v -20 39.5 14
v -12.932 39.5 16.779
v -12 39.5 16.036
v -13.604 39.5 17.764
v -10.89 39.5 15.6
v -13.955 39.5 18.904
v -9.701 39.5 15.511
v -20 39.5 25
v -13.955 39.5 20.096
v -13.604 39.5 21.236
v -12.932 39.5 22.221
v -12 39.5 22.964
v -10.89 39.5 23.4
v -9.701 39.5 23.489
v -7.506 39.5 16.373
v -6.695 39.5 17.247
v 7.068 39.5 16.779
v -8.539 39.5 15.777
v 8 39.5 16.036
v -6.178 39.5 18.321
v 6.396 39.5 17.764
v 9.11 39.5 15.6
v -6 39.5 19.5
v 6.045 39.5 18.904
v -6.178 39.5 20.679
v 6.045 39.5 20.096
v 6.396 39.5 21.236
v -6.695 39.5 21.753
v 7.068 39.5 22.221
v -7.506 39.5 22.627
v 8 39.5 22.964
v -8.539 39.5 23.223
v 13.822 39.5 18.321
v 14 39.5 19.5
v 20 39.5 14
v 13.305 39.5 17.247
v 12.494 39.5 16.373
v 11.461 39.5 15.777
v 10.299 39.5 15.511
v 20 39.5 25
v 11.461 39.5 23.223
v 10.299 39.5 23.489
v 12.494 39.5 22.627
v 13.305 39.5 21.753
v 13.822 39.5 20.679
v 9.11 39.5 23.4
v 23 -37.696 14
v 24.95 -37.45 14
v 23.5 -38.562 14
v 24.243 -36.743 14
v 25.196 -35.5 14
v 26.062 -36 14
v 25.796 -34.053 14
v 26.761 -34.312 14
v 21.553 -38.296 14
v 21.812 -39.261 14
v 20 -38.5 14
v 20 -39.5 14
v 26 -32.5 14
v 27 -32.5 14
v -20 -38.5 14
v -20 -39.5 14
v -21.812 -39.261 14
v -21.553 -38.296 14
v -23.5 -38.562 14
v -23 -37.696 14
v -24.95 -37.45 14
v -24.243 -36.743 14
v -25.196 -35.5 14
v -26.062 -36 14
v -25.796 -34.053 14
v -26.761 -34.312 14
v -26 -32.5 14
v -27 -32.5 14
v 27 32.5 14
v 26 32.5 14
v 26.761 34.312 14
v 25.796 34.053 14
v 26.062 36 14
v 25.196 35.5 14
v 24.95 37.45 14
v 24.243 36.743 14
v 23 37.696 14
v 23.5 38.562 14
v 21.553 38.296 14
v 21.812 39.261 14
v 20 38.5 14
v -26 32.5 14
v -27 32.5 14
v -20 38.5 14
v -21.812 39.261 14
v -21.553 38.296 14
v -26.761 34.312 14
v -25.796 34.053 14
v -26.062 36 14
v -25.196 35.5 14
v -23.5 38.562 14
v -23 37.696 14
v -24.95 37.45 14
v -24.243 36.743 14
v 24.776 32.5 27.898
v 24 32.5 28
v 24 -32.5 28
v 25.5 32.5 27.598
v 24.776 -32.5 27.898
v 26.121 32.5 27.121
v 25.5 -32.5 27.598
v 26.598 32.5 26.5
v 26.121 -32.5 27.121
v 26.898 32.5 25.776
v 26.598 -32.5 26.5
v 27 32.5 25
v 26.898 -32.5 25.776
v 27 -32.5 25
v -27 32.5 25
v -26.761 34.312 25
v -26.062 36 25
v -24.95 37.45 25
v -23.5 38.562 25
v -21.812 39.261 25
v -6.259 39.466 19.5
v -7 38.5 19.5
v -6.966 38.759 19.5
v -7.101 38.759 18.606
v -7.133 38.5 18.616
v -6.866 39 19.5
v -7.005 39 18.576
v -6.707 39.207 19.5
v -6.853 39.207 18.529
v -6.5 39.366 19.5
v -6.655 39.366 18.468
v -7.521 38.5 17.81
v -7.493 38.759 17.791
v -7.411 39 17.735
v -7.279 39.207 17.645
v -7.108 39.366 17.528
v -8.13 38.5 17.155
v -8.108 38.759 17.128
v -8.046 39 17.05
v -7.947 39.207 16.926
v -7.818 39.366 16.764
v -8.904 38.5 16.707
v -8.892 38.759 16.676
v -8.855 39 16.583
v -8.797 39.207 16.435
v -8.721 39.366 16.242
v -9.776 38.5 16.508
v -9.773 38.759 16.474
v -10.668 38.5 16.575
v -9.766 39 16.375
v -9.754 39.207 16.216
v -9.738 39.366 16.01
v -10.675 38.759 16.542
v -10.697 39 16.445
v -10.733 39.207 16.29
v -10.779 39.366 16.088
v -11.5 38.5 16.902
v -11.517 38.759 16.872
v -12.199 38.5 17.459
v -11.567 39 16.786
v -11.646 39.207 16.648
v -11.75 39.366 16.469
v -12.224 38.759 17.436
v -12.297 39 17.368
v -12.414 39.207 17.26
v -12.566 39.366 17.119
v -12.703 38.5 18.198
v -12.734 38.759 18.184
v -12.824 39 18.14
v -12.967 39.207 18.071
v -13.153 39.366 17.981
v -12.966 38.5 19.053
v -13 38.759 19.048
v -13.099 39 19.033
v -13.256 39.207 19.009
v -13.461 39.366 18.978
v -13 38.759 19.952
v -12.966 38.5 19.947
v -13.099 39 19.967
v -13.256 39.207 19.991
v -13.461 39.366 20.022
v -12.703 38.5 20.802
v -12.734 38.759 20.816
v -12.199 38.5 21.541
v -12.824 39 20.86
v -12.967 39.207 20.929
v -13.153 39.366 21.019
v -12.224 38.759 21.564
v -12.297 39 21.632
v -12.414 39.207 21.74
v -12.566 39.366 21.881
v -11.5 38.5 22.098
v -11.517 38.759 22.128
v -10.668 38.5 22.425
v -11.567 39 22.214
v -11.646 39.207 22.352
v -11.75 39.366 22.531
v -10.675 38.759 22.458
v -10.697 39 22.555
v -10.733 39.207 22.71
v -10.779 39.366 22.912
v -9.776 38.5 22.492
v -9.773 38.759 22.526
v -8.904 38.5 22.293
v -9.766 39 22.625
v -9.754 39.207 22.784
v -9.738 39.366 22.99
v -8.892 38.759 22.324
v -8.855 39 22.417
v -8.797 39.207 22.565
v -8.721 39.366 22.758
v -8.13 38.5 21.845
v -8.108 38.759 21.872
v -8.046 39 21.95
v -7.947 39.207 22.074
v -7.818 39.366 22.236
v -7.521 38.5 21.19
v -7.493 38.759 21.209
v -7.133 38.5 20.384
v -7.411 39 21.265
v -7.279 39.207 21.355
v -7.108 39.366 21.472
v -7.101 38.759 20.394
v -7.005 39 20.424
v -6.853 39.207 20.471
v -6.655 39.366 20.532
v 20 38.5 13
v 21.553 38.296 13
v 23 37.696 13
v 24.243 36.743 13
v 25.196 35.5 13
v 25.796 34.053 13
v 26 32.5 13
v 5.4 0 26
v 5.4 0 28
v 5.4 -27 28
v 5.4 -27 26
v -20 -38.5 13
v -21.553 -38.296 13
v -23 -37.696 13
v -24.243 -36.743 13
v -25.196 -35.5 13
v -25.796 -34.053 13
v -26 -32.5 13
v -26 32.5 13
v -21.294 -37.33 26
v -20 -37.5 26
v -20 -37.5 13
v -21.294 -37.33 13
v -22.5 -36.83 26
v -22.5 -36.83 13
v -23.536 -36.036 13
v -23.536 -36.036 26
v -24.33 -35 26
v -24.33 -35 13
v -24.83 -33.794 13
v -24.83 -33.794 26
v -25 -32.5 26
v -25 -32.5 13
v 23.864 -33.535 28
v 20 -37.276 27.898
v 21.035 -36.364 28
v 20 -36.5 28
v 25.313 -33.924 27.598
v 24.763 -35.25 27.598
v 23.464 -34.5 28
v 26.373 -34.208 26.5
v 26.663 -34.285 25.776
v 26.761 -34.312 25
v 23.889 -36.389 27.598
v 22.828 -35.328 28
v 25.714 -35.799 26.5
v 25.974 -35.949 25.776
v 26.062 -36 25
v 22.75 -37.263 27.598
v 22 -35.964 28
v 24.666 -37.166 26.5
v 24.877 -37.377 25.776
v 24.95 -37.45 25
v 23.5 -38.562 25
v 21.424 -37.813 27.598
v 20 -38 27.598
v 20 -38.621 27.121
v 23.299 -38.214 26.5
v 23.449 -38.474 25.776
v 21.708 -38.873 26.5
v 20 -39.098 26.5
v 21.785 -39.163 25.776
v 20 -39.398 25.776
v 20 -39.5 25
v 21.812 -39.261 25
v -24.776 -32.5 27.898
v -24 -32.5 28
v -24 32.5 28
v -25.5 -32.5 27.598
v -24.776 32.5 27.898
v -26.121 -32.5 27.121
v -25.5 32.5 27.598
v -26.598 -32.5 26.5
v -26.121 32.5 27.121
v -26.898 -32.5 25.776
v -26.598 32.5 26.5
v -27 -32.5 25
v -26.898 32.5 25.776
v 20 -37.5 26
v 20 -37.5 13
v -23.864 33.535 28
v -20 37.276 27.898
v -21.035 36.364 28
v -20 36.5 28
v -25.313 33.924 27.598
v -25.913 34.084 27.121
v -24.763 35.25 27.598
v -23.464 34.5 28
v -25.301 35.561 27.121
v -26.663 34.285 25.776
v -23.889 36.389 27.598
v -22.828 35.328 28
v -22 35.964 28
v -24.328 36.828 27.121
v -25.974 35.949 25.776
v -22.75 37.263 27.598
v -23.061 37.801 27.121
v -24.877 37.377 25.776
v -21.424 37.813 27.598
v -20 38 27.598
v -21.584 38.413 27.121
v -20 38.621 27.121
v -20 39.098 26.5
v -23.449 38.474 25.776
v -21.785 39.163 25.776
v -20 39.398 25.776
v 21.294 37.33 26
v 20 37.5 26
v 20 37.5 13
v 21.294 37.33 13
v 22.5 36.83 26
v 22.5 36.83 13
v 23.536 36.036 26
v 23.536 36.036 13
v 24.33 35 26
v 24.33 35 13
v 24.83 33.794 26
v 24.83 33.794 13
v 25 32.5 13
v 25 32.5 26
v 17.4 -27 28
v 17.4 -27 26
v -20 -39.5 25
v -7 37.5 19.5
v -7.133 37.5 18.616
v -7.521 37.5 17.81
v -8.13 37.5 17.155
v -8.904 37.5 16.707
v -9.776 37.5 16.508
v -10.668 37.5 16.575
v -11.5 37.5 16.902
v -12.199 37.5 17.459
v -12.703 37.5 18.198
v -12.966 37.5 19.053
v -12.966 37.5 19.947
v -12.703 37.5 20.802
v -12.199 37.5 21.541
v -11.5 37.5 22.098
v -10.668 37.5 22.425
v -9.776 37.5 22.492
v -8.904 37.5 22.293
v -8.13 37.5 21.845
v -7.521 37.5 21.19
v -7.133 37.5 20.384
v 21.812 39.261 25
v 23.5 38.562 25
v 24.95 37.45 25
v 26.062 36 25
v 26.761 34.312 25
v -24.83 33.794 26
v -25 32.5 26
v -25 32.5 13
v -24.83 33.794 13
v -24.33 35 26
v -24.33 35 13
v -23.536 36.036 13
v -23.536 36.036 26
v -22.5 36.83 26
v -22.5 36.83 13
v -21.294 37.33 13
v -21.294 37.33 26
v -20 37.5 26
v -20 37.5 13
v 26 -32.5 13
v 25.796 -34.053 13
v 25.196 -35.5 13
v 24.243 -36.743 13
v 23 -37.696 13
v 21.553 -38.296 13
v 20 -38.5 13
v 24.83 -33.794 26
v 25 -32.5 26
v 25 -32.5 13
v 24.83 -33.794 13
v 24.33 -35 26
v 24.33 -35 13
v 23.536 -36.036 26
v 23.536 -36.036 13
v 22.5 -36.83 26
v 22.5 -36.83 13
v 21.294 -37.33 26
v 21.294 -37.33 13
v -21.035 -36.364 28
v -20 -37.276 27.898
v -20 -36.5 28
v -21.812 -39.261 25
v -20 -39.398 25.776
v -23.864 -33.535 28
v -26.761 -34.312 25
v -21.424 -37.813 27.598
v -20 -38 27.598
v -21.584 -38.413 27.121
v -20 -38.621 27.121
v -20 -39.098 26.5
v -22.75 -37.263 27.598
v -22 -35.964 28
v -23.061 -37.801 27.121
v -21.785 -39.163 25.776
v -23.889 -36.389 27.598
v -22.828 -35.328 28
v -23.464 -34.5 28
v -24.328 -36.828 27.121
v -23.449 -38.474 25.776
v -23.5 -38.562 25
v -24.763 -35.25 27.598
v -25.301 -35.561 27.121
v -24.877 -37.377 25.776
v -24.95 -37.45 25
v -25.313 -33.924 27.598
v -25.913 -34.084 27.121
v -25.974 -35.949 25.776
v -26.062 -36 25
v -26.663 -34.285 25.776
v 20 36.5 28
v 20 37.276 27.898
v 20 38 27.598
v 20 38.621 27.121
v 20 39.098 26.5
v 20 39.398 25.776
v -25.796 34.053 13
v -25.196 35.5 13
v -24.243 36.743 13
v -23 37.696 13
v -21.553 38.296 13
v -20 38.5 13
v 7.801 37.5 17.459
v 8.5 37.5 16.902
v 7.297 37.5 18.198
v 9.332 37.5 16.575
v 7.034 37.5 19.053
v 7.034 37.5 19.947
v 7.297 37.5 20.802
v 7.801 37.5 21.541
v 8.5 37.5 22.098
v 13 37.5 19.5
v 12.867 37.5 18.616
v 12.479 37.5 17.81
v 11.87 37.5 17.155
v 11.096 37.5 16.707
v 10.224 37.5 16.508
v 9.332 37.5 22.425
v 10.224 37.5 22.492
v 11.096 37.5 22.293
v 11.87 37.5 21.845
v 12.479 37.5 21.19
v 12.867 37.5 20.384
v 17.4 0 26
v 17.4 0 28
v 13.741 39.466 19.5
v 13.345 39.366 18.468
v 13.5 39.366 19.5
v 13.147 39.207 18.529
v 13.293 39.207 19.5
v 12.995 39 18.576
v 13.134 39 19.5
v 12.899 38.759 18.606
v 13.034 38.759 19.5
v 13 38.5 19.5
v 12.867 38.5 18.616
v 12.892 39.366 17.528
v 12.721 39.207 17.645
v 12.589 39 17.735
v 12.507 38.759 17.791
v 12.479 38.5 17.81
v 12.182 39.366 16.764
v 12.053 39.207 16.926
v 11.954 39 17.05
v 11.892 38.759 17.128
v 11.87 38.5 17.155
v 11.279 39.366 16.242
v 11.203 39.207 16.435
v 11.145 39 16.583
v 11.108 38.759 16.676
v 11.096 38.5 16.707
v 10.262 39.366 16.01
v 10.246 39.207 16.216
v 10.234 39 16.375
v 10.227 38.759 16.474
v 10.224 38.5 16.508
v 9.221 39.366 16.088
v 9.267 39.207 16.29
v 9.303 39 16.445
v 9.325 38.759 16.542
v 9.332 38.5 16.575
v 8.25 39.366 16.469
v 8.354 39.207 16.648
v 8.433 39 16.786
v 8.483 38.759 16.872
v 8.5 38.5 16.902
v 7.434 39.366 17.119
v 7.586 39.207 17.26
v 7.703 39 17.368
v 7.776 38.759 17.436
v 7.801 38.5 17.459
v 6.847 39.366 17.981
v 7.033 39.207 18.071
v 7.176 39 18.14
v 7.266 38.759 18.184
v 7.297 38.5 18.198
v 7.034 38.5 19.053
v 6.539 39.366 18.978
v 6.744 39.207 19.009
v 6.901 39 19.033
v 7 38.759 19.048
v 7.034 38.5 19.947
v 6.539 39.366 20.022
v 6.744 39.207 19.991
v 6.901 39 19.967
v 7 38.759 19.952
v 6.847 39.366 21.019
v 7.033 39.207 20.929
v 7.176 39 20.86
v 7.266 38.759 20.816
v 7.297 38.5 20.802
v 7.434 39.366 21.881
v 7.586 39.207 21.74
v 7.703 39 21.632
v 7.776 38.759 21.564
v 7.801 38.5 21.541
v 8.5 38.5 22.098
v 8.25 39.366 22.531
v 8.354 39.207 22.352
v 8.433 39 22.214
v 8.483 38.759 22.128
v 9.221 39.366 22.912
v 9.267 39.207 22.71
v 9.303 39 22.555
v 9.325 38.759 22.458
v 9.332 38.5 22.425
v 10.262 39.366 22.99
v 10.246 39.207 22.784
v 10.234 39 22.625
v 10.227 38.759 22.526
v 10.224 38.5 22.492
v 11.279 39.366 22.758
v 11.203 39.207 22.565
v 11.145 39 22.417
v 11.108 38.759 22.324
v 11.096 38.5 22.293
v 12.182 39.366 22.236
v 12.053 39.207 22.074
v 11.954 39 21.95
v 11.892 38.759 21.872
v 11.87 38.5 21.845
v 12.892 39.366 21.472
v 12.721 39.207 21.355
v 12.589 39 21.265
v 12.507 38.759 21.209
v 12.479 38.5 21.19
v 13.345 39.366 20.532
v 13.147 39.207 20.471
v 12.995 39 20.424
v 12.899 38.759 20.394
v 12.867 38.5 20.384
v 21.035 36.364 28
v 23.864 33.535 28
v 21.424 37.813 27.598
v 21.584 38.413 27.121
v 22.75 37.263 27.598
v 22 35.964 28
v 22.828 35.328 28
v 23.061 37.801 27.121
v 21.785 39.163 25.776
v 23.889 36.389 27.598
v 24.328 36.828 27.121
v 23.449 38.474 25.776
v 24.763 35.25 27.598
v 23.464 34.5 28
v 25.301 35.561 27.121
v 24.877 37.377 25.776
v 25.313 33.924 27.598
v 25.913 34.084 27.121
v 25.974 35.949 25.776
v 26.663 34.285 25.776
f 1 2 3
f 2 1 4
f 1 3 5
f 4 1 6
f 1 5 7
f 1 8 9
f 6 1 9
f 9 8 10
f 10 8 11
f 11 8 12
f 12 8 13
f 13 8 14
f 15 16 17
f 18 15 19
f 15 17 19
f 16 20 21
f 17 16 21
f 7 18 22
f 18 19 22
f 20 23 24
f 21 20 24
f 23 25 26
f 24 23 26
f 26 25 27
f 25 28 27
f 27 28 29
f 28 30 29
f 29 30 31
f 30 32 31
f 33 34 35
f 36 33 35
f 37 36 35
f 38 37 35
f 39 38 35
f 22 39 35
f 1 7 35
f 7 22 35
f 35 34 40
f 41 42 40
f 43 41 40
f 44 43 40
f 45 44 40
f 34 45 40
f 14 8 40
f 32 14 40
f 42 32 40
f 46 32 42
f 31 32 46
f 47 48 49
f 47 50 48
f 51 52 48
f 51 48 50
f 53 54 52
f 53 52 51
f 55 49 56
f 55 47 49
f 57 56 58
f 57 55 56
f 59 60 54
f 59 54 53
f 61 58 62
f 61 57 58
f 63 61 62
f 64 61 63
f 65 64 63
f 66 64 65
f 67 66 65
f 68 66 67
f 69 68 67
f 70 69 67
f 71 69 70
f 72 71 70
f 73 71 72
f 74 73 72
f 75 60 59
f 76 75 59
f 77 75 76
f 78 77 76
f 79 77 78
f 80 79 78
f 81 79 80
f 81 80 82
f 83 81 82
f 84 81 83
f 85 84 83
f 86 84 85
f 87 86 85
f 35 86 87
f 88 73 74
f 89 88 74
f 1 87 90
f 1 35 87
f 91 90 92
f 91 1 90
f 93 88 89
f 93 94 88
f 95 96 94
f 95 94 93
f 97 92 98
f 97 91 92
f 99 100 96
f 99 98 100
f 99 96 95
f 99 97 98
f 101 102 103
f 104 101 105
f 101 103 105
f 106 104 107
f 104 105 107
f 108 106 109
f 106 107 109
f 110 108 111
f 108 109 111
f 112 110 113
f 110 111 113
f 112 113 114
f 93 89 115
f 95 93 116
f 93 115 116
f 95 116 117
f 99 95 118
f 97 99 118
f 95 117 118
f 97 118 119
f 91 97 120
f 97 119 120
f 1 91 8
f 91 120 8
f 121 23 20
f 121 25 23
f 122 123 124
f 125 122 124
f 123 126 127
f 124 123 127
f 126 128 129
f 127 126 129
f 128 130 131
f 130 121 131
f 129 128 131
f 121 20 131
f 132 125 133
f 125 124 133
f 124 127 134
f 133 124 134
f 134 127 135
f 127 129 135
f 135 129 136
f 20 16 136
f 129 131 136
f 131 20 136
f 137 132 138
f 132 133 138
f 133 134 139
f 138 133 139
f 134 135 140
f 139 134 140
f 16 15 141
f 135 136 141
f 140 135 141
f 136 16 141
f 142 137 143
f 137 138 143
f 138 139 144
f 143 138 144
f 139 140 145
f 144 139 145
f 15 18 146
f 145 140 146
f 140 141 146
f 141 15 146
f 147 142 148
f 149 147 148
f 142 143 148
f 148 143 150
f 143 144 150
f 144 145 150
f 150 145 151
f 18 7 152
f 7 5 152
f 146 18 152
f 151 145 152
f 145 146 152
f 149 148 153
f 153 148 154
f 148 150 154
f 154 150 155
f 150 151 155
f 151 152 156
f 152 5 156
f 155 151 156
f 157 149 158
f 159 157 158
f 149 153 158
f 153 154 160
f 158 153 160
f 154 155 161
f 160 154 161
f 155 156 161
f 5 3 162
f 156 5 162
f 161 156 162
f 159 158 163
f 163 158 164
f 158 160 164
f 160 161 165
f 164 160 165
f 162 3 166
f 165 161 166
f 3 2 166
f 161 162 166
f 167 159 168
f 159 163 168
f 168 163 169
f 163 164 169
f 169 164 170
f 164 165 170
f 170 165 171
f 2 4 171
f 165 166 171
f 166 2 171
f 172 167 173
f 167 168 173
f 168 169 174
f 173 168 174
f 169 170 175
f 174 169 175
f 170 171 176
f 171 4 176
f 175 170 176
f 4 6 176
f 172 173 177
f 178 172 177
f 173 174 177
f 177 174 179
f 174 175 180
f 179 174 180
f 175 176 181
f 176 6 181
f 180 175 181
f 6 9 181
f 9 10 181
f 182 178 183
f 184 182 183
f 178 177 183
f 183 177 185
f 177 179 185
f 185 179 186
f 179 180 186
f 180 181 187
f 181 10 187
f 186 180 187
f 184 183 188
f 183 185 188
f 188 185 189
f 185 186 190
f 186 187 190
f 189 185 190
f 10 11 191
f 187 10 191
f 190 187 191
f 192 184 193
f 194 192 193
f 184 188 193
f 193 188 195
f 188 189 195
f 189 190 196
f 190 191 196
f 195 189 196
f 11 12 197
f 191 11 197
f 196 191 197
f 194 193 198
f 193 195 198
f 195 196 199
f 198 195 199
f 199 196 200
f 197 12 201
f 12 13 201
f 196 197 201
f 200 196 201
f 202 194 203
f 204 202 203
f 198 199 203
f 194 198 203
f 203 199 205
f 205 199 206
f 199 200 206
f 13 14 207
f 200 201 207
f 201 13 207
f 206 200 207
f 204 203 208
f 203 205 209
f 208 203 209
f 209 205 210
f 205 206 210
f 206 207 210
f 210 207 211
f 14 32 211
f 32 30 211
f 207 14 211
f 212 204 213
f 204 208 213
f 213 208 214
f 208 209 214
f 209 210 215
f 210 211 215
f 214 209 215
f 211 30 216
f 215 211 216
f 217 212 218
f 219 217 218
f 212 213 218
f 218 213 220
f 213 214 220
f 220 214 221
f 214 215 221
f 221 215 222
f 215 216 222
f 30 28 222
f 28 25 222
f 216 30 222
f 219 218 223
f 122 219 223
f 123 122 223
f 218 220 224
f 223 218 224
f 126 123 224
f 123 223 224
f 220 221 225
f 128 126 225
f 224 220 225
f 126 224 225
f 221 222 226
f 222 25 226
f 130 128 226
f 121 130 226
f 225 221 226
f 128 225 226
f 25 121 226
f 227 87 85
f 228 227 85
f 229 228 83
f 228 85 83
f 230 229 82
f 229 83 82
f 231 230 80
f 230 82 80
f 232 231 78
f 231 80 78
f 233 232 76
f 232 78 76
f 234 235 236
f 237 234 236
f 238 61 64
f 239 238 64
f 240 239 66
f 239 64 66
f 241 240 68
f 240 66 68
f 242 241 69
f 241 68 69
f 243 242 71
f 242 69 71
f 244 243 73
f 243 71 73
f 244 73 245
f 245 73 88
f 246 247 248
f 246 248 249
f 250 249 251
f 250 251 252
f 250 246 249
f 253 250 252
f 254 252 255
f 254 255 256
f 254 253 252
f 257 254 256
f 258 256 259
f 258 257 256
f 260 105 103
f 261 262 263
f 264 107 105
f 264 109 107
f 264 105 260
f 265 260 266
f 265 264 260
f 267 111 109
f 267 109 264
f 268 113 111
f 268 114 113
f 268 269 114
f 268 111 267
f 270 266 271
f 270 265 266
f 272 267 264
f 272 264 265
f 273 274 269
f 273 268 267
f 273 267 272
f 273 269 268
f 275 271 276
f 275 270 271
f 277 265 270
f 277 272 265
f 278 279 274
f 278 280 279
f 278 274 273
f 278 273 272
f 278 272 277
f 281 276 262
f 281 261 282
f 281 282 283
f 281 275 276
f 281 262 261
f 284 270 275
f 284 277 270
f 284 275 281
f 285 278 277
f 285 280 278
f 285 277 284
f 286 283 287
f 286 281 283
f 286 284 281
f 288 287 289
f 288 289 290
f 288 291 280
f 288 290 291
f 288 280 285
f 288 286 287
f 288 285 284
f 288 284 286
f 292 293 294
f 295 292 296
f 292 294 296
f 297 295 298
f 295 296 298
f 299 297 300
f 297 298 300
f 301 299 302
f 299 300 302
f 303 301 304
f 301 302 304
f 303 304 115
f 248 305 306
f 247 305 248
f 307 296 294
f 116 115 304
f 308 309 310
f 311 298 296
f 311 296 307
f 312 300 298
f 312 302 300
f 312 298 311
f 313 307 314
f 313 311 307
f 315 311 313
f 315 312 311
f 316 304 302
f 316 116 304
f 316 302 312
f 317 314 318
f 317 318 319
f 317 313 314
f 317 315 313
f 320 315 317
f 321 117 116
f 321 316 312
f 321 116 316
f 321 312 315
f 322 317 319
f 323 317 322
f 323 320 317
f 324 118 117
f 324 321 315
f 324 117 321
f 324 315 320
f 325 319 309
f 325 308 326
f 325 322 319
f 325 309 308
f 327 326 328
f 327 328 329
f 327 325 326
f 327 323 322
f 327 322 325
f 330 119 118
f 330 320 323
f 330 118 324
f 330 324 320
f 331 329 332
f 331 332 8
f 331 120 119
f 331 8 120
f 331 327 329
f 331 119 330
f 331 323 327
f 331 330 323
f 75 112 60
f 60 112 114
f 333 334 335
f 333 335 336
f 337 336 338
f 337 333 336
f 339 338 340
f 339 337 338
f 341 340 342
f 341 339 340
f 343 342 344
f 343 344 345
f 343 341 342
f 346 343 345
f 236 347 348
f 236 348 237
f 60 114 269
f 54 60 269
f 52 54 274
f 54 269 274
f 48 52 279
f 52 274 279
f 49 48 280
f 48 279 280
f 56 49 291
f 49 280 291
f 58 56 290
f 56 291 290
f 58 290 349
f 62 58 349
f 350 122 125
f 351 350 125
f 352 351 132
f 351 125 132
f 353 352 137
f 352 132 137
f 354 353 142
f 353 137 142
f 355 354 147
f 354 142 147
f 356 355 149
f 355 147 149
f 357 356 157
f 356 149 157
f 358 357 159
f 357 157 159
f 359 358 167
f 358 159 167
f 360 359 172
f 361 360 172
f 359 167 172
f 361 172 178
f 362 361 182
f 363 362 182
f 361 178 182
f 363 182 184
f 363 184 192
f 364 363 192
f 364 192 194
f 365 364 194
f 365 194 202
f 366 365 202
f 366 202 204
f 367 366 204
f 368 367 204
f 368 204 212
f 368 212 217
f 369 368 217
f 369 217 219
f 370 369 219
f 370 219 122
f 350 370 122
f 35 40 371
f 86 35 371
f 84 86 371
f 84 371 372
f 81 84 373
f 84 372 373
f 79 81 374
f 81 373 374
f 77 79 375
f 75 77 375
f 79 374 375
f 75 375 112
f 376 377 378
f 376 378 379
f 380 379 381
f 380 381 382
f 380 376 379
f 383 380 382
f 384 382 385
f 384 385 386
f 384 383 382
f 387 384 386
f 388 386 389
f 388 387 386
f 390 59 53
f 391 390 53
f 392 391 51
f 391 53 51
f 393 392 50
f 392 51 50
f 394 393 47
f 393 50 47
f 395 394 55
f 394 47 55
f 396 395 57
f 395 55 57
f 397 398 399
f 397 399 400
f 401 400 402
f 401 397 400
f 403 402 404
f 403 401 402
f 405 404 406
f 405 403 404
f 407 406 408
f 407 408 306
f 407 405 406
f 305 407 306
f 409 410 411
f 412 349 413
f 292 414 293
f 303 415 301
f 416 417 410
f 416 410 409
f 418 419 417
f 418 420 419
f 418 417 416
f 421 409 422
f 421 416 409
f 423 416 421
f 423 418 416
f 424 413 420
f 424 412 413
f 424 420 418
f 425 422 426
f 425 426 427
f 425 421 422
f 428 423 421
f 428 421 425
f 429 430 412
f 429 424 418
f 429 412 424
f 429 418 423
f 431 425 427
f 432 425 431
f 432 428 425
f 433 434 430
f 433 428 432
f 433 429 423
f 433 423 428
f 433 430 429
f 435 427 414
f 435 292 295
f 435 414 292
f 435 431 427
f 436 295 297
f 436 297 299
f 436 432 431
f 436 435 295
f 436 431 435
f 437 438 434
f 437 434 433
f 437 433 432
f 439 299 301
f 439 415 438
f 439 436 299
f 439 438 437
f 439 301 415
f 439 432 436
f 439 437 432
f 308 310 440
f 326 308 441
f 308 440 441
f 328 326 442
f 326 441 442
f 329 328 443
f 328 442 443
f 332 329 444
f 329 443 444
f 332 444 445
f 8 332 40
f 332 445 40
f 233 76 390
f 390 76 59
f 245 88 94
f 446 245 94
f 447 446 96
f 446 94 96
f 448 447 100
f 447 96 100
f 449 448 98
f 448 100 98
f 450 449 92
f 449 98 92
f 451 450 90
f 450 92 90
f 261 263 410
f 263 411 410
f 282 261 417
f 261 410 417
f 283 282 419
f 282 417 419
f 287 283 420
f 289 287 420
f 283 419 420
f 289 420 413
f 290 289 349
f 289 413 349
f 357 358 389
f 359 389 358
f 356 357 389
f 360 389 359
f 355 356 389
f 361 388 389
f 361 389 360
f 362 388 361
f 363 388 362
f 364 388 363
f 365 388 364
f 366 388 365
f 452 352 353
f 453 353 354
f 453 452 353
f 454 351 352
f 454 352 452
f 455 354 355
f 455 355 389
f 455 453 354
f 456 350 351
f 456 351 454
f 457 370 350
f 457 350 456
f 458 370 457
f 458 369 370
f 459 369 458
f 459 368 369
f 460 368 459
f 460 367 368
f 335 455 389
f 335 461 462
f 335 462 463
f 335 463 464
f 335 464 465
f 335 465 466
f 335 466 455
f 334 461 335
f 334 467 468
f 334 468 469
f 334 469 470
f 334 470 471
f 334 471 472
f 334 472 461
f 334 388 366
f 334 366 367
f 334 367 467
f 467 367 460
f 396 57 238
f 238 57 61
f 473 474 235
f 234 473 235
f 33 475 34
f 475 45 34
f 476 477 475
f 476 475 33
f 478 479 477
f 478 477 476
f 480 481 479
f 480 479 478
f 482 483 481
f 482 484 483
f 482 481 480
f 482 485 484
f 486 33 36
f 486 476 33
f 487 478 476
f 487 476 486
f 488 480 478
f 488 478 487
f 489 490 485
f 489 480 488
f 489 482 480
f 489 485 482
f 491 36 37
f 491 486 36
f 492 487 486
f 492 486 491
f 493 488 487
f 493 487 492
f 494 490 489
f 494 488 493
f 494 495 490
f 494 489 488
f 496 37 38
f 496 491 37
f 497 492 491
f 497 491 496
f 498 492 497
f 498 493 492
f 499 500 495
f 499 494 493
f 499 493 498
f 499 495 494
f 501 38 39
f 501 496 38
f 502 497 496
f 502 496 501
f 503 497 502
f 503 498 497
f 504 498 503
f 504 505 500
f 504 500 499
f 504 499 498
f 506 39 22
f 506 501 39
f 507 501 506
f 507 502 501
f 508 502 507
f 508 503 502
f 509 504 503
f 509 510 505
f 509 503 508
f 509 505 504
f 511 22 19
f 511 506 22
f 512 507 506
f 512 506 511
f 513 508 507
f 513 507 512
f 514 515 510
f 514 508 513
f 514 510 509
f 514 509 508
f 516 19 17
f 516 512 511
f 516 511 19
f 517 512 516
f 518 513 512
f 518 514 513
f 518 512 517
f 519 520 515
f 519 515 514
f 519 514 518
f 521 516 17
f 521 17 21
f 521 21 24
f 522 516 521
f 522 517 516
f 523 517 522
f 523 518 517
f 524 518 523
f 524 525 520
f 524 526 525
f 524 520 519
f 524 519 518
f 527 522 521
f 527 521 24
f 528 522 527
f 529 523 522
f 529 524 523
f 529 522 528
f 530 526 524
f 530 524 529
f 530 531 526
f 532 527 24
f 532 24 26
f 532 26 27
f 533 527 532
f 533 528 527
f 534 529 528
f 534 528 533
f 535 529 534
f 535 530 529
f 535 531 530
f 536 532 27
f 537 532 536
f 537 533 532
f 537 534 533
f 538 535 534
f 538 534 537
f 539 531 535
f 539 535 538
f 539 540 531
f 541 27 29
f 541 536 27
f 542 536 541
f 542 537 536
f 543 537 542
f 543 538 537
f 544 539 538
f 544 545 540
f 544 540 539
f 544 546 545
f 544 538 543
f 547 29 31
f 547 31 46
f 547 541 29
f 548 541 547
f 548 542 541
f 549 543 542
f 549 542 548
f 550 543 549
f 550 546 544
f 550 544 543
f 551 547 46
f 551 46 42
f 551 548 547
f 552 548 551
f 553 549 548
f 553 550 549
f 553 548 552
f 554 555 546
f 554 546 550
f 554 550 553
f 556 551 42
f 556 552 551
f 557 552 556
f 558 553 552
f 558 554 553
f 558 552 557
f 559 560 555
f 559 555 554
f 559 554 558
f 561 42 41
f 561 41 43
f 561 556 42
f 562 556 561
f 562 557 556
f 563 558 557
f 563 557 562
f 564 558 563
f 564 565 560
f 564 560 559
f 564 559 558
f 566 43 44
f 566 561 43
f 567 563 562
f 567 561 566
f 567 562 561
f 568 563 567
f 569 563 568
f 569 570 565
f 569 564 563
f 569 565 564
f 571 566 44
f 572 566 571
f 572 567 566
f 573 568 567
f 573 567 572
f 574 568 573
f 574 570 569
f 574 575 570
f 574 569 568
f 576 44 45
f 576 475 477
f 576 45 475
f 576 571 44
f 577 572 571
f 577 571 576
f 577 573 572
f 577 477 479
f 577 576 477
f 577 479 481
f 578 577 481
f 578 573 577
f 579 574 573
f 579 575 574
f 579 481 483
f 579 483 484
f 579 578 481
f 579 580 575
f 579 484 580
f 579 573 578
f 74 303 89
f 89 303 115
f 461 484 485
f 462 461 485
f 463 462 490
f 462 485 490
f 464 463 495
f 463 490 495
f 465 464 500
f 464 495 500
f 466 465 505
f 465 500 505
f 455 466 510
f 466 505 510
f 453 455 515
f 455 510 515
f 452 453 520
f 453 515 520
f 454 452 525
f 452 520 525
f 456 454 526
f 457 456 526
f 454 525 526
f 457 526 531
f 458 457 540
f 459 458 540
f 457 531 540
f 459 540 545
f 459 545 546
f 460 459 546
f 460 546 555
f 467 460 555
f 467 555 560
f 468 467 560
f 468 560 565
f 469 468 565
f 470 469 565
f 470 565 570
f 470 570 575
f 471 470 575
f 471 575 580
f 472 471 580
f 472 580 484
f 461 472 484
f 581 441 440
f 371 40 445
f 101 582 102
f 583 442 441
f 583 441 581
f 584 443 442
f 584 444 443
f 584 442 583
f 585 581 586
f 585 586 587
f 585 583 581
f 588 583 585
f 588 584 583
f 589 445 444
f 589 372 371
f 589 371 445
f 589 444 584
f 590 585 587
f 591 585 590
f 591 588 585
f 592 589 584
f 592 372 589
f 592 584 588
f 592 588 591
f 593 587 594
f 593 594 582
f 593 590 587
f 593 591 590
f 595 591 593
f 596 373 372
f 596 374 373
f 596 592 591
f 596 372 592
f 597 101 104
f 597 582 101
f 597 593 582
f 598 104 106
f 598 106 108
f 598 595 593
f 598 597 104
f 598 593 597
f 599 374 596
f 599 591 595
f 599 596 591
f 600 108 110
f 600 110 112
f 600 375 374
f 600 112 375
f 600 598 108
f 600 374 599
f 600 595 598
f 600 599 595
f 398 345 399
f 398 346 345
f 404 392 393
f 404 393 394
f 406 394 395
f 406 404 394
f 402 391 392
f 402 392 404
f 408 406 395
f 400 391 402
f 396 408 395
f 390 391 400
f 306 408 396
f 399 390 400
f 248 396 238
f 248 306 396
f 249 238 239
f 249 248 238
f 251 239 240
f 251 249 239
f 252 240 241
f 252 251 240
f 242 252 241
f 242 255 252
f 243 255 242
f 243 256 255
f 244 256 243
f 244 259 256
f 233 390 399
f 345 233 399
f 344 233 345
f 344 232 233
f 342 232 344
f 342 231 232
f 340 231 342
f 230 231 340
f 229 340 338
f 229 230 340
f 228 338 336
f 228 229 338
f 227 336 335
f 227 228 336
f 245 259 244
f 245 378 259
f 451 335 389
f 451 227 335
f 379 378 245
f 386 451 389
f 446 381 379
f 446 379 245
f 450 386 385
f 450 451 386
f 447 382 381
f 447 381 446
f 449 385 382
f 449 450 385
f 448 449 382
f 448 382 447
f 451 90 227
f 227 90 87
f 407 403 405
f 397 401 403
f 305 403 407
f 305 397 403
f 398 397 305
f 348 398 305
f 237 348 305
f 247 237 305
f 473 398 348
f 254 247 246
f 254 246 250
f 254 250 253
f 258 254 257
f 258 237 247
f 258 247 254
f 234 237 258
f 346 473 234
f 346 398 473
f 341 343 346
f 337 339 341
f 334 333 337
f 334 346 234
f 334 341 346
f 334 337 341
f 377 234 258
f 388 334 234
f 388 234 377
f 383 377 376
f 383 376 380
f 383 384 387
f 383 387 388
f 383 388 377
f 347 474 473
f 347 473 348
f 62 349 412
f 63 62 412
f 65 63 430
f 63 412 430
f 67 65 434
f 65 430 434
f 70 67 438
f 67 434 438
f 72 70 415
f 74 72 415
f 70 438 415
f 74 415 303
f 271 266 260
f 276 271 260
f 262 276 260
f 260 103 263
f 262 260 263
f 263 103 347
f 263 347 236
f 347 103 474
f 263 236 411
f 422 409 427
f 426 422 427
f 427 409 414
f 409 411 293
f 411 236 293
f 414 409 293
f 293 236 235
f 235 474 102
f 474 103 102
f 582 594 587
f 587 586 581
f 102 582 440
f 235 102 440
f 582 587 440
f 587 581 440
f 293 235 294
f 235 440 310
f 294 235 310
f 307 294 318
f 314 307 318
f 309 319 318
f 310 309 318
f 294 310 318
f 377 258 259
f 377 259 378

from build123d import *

# Parameters (mm, degrees)
PAD002_DEPTH            = 2
PAD003_DEPTH            = 12
FILLET001_R             = 3
SKETCH006_R             = 3
POCKET002_DEPTH         = 5
PAD004_DEPTH            = 1
FILLET003_R             = 1
SKETCH018_W             = 12
SKETCH018_H             = 27
POCKET004_DEPTH         = 5
BODY001_PLACEMENT_ANGLE = 180


with BuildPart() as part:
    # Sketch003 → Pad002 (new body)
    with BuildSketch(Plane.XY):
        with BuildLine():
            Line((-27, 32.5), (-27, -32.5))
            ThreePointArc((-27, -32.5), (-24.949747, -37.449747), (-20, -39.5))
            Line((-20, -39.5), (20, -39.5))
            ThreePointArc((20, -39.5), (24.949747, -37.449747), (27, -32.5))
            Line((27, -32.5), (27, 32.5))
            ThreePointArc((27, 32.5), (24.949747, 37.449747), (20, 39.5))
            Line((20, 39.5), (-20, 39.5))
            ThreePointArc((-20, 39.5), (-24.949747, 37.449747), (-27, 32.5))
        make_face()
    extrude(amount=PAD002_DEPTH)

    # Sketch004 (on Face10 of Pad002) → Pad003 (join)
    with BuildSketch(Plane.XY.offset(2)):
        with BuildLine():
            Line((-27, 32.5), (-27, -32.5))
            ThreePointArc((-27, -32.5), (-24.949747, -37.449747), (-20, -39.5))
            Line((-20, -39.5), (20, -39.5))
            ThreePointArc((20, -39.5), (24.949747, -37.449747), (27, -32.5))
            Line((27, -32.5), (27, 32.5))
            ThreePointArc((27, 32.5), (24.949747, 37.449747), (20, 39.5))
            Line((20, 39.5), (-20, 39.5))
            ThreePointArc((-20, 39.5), (-24.949747, 37.449747), (-27, 32.5))
        make_face()
        with BuildLine():
            Line((-25, 32.5), (-25, -32.5))
            ThreePointArc((-25, -32.5), (-23.535534, -36.035534), (-20, -37.5))
            Line((-20, -37.5), (20, -37.5))
            ThreePointArc((20, -37.5), (23.535534, -36.035534), (25, -32.5))
            Line((25, -32.5), (25, 32.5))
            ThreePointArc((25, 32.5), (23.535534, 36.035534), (20, 37.5))
            Line((20, 37.5), (-20, 37.5))
            ThreePointArc((-20, 37.5), (-23.535534, 36.035534), (-25, 32.5))
        make_face(mode=Mode.SUBTRACT)
    extrude(amount=PAD003_DEPTH)

    # Fillet001
    fillet001_edges = [part.edges().sort_by_distance(p)[0] for p in [
        (0, -39.5, 0),
    ]]
    fillet(fillet001_edges, radius=FILLET001_R)

    # Sketch006 (on Face17 of Fillet001) → Pocket002 (cut)
    with BuildSketch(Plane(origin=(0, 39.5, 0), x_dir=(-1, 0, 0), z_dir=(0, 1, 0))):
        with Locations((-10, 8.5)):
            Circle(SKETCH006_R)
        with Locations((10, 8.5)):
            Circle(SKETCH006_R)
    extrude(amount=-POCKET002_DEPTH, mode=Mode.SUBTRACT)

    # Sketch008 (on Face18 of Pocket002) → Pad004 (join)
    with BuildSketch(Plane.XY.offset(14)):
        with BuildLine():
            Line((-26, 32.5), (-26, -32.5))
            ThreePointArc((-26, -32.5), (-24.242641, -36.742641), (-20, -38.5))
            Line((-20, -38.5), (20, -38.5))
            ThreePointArc((20, -38.5), (24.242641, -36.742641), (26, -32.5))
            Line((26, -32.5), (26, 32.5))
            ThreePointArc((26, 32.5), (24.242641, 36.742641), (20, 38.5))
            Line((20, 38.5), (-20, 38.5))
            ThreePointArc((-20, 38.5), (-24.242641, 36.742641), (-26, 32.5))
        make_face()
        with BuildLine():
            Line((-25, 32.5), (-25, -32.5))
            ThreePointArc((-25, -32.5), (-23.535534, -36.035534), (-20, -37.5))
            Line((-20, -37.5), (20, -37.5))
            ThreePointArc((20, -37.5), (23.535534, -36.035534), (25, -32.5))
            Line((25, -32.5), (25, 32.5))
            ThreePointArc((25, 32.5), (23.535534, 36.035534), (20, 37.5))
            Line((20, 37.5), (-20, 37.5))
            ThreePointArc((-20, 37.5), (-23.535534, 36.035534), (-25, 32.5))
        make_face(mode=Mode.SUBTRACT)
    extrude(amount=PAD004_DEPTH)

    # Fillet003
    fillet003_edges = [part.edges().sort_by_distance(p)[0] for p in [
        (-7, 39.5, 8.5),
        (13, 39.5, 8.5),
    ]]
    fillet(fillet003_edges, radius=FILLET003_R)

    # Sketch018 (on Face12 of Fillet003) → Pocket004 (cut)
    with BuildSketch(Plane(origin=(0, 0, 0), x_dir=(1, 0, 0), z_dir=(0, 0, -1))):
        with Locations((-11.4, 13.5)):
            Rectangle(SKETCH018_W, SKETCH018_H)
    extrude(amount=-POCKET004_DEPTH, mode=Mode.SUBTRACT)


with BuildPart() as part_1:
    # Body001 placement: moved
    add(part.part.moved(Location((0, 0, 28))).rotate(Axis((0, 0, 28), (0, 1, 0)), BODY001_PLACEMENT_ANGLE))


solid = part_1.part
